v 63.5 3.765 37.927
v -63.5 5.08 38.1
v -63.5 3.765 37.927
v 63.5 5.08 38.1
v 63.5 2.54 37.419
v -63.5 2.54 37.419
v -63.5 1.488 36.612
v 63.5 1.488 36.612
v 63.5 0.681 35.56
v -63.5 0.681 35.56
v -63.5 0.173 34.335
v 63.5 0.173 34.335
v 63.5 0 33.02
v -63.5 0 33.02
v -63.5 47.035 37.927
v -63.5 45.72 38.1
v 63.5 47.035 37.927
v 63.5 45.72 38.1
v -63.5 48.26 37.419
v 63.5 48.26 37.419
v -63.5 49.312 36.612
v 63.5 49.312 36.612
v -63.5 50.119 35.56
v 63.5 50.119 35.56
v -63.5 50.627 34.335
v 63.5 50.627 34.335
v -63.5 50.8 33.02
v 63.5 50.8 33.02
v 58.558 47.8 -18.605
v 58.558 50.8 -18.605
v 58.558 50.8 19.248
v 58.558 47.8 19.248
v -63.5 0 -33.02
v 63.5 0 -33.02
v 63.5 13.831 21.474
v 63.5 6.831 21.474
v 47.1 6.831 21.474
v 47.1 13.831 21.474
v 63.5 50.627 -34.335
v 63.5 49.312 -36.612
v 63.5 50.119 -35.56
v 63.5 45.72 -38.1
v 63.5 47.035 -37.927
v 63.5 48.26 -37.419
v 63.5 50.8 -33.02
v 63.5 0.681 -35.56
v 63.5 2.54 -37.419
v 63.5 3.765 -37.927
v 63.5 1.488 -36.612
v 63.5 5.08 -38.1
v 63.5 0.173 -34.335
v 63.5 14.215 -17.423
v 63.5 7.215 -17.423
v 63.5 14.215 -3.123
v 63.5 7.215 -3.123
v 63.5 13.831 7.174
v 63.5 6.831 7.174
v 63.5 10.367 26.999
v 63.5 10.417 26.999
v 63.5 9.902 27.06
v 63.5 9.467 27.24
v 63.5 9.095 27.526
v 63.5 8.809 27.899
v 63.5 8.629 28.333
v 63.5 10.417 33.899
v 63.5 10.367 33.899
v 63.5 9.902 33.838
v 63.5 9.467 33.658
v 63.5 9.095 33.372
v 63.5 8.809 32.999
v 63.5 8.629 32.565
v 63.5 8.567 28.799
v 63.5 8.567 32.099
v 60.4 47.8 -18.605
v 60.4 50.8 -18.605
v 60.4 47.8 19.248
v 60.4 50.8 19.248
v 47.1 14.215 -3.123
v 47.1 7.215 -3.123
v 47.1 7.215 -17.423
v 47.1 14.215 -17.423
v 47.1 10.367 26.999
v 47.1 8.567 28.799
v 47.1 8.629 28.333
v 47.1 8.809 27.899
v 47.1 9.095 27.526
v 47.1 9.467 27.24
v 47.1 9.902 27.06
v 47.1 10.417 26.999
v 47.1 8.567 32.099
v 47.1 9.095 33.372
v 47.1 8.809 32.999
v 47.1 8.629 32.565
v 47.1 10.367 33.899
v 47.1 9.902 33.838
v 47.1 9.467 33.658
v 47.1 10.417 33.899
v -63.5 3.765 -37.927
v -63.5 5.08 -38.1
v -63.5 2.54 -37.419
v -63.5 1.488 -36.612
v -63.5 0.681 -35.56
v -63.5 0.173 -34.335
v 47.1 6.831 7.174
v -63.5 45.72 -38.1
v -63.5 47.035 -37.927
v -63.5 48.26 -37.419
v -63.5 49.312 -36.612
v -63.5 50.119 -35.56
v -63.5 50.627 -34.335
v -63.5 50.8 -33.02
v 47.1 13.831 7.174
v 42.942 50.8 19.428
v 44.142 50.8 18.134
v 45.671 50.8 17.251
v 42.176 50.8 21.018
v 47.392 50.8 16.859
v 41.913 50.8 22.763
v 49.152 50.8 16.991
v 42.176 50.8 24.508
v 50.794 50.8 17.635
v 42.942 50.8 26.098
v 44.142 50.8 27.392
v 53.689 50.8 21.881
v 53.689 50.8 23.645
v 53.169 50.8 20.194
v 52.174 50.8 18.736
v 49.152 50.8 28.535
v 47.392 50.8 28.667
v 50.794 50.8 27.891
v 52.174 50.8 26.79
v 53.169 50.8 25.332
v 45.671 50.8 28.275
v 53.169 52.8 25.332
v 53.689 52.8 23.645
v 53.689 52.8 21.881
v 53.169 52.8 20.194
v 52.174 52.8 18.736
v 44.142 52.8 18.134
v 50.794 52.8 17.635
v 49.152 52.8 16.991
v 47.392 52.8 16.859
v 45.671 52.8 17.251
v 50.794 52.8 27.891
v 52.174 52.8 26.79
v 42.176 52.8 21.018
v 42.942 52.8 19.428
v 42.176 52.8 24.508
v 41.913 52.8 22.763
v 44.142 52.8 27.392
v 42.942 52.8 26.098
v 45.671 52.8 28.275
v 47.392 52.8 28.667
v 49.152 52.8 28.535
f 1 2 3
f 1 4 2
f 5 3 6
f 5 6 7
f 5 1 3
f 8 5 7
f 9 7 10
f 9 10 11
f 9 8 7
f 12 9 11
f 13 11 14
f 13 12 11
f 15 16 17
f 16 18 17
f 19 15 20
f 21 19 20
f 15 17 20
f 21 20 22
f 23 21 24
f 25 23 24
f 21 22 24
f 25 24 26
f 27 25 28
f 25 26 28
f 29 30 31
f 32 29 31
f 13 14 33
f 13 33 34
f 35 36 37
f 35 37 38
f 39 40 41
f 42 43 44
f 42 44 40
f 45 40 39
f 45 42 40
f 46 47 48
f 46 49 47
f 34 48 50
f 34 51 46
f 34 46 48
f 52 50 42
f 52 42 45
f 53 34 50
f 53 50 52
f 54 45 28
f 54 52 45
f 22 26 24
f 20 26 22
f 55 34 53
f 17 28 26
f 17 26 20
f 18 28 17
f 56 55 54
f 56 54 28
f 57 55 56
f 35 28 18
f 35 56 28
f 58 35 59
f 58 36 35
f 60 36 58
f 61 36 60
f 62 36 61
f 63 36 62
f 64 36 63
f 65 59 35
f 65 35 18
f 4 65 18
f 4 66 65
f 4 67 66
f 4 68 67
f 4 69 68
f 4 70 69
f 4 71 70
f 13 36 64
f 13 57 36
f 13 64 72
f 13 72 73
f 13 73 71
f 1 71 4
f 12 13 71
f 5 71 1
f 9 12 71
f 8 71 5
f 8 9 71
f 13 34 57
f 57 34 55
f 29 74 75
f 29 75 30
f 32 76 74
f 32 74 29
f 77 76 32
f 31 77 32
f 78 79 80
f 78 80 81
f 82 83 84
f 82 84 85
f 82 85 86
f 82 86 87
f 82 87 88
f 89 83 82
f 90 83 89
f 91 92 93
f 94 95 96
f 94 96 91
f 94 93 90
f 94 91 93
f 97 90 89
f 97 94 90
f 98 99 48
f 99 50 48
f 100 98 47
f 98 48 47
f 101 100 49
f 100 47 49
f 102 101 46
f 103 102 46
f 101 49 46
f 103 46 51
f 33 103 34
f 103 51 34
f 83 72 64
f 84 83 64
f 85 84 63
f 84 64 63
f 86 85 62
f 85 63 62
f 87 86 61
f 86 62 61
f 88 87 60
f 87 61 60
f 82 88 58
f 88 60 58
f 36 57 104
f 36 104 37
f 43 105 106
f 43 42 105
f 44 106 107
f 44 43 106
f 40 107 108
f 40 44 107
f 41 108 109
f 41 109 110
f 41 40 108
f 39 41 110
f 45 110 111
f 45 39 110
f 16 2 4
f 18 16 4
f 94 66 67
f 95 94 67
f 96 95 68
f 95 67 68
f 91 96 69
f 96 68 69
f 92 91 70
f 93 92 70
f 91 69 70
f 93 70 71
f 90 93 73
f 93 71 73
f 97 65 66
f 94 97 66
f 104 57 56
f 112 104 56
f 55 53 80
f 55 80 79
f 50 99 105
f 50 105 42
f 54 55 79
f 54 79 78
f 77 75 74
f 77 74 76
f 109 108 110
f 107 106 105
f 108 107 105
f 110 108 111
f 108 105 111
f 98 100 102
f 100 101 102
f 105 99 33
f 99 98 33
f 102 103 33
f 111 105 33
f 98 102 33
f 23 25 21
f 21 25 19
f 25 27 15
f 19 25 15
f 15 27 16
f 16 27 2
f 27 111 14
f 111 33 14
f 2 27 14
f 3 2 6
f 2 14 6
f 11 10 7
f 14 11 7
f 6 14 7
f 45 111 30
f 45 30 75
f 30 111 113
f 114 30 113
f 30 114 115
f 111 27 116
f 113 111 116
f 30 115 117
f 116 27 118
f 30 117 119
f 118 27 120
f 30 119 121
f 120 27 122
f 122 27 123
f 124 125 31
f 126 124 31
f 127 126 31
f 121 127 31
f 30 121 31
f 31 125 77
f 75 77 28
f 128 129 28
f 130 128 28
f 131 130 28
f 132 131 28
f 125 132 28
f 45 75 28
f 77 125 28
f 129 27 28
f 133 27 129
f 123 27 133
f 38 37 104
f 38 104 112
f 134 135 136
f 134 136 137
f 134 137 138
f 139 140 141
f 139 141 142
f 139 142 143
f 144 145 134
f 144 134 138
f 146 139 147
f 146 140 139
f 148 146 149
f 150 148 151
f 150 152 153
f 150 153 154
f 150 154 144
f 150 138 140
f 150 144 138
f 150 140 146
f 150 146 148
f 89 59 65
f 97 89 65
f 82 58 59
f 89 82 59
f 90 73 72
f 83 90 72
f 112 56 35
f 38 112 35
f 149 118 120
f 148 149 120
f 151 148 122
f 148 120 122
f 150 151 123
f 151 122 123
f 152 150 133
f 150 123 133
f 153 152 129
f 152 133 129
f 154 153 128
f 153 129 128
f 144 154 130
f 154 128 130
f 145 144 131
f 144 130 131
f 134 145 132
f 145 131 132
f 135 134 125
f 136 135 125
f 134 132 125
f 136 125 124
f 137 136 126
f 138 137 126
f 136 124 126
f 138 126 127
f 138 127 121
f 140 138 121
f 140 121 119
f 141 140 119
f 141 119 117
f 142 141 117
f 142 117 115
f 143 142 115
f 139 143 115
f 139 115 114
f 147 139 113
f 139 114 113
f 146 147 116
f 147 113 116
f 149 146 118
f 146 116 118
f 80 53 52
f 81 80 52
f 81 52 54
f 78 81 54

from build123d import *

# Parameters (mm, degrees)
F0_W      = 127
F0_H      = 76.2
F1_DEPTH  = 50.8
F2_R      = 5.08
F3_W      = 7
F3_H      = 14.3
F4_DEPTH  = 16.4
F5_W      = 7
F5_H      = 14.3
F6_DEPTH  = 16.4
F8_DEPTH  = 16.4
F9_W      = 1.841523
F9_H      = 37.853485
F10_DEPTH = 3
F11_R     = 5.920901
F12_DEPTH = 2


with BuildPart() as f1:
    # F0 (on Front) → F1 (new body)
    with BuildSketch(Plane.XZ):
        Rectangle(F0_W, F0_H)
    extrude(amount=-F1_DEPTH)

    # F2
    f2_edges = [f1.edges().sort_by_distance(p)[0] for p in [
        (0, 50.8, -38.1),
        (0, 0, -38.1),
        (0, 0, 38.1),
        (0, 50.8, 38.1),
    ]]
    fillet(f2_edges, radius=F2_R)

    # F3 (on face) → F4 (cut)
    with BuildSketch(Plane.YZ.offset(63.5)):
        with Locations((10.331045, 14.323671)):
            Rectangle(F3_W, F3_H)
    extrude(amount=-F4_DEPTH, mode=Mode.SUBTRACT)

    # F5 (on face) → F6 (cut)
    with BuildSketch(Plane.YZ.offset(63.5)):
        with Locations((10.71509, -10.272532)):
            Rectangle(F5_W, F5_H)
    extrude(amount=-F6_DEPTH, mode=Mode.SUBTRACT)

    # F7 (on face) → F8 (cut)
    with BuildSketch(Plane.YZ.offset(63.5)):
        with BuildLine():
            Line((10.417472, 33.898923), (10.367472, 33.898923))
            ThreePointArc((10.367472, 33.898923), (9.09468, 33.371715), (8.567472, 32.098923))
            Line((8.567472, 32.098923), (8.567472, 28.798923))
            ThreePointArc((8.567472, 28.798923), (9.09468, 27.526131), (10.367472, 26.998923))
            Line((10.367472, 26.998923), (10.417472, 26.998923))
            Line((10.417472, 26.998923), (10.417472, 33.898923))
        make_face()
    extrude(amount=-F8_DEPTH, mode=Mode.SUBTRACT)

    # F9 (on face) → F10 (cut)
    with BuildSketch(Plane(origin=(0, 50.8, 0), x_dir=(-1, 0, 0), z_dir=(0, 1, 0))):
        with Locations((-59.478882, 0.321649)):
            Rectangle(F9_W, F9_H)
    extrude(amount=-F10_DEPTH, mode=Mode.SUBTRACT)

    # F11 (on face) → F12 (join)
    with BuildSketch(Plane(origin=(0, 50.8, 0), x_dir=(-1, 0, 0), z_dir=(0, 1, 0))):
        with Locations((-47.834026, 22.763033)):
            Circle(F11_R)
    extrude(amount=F12_DEPTH)


solid = f1.part
